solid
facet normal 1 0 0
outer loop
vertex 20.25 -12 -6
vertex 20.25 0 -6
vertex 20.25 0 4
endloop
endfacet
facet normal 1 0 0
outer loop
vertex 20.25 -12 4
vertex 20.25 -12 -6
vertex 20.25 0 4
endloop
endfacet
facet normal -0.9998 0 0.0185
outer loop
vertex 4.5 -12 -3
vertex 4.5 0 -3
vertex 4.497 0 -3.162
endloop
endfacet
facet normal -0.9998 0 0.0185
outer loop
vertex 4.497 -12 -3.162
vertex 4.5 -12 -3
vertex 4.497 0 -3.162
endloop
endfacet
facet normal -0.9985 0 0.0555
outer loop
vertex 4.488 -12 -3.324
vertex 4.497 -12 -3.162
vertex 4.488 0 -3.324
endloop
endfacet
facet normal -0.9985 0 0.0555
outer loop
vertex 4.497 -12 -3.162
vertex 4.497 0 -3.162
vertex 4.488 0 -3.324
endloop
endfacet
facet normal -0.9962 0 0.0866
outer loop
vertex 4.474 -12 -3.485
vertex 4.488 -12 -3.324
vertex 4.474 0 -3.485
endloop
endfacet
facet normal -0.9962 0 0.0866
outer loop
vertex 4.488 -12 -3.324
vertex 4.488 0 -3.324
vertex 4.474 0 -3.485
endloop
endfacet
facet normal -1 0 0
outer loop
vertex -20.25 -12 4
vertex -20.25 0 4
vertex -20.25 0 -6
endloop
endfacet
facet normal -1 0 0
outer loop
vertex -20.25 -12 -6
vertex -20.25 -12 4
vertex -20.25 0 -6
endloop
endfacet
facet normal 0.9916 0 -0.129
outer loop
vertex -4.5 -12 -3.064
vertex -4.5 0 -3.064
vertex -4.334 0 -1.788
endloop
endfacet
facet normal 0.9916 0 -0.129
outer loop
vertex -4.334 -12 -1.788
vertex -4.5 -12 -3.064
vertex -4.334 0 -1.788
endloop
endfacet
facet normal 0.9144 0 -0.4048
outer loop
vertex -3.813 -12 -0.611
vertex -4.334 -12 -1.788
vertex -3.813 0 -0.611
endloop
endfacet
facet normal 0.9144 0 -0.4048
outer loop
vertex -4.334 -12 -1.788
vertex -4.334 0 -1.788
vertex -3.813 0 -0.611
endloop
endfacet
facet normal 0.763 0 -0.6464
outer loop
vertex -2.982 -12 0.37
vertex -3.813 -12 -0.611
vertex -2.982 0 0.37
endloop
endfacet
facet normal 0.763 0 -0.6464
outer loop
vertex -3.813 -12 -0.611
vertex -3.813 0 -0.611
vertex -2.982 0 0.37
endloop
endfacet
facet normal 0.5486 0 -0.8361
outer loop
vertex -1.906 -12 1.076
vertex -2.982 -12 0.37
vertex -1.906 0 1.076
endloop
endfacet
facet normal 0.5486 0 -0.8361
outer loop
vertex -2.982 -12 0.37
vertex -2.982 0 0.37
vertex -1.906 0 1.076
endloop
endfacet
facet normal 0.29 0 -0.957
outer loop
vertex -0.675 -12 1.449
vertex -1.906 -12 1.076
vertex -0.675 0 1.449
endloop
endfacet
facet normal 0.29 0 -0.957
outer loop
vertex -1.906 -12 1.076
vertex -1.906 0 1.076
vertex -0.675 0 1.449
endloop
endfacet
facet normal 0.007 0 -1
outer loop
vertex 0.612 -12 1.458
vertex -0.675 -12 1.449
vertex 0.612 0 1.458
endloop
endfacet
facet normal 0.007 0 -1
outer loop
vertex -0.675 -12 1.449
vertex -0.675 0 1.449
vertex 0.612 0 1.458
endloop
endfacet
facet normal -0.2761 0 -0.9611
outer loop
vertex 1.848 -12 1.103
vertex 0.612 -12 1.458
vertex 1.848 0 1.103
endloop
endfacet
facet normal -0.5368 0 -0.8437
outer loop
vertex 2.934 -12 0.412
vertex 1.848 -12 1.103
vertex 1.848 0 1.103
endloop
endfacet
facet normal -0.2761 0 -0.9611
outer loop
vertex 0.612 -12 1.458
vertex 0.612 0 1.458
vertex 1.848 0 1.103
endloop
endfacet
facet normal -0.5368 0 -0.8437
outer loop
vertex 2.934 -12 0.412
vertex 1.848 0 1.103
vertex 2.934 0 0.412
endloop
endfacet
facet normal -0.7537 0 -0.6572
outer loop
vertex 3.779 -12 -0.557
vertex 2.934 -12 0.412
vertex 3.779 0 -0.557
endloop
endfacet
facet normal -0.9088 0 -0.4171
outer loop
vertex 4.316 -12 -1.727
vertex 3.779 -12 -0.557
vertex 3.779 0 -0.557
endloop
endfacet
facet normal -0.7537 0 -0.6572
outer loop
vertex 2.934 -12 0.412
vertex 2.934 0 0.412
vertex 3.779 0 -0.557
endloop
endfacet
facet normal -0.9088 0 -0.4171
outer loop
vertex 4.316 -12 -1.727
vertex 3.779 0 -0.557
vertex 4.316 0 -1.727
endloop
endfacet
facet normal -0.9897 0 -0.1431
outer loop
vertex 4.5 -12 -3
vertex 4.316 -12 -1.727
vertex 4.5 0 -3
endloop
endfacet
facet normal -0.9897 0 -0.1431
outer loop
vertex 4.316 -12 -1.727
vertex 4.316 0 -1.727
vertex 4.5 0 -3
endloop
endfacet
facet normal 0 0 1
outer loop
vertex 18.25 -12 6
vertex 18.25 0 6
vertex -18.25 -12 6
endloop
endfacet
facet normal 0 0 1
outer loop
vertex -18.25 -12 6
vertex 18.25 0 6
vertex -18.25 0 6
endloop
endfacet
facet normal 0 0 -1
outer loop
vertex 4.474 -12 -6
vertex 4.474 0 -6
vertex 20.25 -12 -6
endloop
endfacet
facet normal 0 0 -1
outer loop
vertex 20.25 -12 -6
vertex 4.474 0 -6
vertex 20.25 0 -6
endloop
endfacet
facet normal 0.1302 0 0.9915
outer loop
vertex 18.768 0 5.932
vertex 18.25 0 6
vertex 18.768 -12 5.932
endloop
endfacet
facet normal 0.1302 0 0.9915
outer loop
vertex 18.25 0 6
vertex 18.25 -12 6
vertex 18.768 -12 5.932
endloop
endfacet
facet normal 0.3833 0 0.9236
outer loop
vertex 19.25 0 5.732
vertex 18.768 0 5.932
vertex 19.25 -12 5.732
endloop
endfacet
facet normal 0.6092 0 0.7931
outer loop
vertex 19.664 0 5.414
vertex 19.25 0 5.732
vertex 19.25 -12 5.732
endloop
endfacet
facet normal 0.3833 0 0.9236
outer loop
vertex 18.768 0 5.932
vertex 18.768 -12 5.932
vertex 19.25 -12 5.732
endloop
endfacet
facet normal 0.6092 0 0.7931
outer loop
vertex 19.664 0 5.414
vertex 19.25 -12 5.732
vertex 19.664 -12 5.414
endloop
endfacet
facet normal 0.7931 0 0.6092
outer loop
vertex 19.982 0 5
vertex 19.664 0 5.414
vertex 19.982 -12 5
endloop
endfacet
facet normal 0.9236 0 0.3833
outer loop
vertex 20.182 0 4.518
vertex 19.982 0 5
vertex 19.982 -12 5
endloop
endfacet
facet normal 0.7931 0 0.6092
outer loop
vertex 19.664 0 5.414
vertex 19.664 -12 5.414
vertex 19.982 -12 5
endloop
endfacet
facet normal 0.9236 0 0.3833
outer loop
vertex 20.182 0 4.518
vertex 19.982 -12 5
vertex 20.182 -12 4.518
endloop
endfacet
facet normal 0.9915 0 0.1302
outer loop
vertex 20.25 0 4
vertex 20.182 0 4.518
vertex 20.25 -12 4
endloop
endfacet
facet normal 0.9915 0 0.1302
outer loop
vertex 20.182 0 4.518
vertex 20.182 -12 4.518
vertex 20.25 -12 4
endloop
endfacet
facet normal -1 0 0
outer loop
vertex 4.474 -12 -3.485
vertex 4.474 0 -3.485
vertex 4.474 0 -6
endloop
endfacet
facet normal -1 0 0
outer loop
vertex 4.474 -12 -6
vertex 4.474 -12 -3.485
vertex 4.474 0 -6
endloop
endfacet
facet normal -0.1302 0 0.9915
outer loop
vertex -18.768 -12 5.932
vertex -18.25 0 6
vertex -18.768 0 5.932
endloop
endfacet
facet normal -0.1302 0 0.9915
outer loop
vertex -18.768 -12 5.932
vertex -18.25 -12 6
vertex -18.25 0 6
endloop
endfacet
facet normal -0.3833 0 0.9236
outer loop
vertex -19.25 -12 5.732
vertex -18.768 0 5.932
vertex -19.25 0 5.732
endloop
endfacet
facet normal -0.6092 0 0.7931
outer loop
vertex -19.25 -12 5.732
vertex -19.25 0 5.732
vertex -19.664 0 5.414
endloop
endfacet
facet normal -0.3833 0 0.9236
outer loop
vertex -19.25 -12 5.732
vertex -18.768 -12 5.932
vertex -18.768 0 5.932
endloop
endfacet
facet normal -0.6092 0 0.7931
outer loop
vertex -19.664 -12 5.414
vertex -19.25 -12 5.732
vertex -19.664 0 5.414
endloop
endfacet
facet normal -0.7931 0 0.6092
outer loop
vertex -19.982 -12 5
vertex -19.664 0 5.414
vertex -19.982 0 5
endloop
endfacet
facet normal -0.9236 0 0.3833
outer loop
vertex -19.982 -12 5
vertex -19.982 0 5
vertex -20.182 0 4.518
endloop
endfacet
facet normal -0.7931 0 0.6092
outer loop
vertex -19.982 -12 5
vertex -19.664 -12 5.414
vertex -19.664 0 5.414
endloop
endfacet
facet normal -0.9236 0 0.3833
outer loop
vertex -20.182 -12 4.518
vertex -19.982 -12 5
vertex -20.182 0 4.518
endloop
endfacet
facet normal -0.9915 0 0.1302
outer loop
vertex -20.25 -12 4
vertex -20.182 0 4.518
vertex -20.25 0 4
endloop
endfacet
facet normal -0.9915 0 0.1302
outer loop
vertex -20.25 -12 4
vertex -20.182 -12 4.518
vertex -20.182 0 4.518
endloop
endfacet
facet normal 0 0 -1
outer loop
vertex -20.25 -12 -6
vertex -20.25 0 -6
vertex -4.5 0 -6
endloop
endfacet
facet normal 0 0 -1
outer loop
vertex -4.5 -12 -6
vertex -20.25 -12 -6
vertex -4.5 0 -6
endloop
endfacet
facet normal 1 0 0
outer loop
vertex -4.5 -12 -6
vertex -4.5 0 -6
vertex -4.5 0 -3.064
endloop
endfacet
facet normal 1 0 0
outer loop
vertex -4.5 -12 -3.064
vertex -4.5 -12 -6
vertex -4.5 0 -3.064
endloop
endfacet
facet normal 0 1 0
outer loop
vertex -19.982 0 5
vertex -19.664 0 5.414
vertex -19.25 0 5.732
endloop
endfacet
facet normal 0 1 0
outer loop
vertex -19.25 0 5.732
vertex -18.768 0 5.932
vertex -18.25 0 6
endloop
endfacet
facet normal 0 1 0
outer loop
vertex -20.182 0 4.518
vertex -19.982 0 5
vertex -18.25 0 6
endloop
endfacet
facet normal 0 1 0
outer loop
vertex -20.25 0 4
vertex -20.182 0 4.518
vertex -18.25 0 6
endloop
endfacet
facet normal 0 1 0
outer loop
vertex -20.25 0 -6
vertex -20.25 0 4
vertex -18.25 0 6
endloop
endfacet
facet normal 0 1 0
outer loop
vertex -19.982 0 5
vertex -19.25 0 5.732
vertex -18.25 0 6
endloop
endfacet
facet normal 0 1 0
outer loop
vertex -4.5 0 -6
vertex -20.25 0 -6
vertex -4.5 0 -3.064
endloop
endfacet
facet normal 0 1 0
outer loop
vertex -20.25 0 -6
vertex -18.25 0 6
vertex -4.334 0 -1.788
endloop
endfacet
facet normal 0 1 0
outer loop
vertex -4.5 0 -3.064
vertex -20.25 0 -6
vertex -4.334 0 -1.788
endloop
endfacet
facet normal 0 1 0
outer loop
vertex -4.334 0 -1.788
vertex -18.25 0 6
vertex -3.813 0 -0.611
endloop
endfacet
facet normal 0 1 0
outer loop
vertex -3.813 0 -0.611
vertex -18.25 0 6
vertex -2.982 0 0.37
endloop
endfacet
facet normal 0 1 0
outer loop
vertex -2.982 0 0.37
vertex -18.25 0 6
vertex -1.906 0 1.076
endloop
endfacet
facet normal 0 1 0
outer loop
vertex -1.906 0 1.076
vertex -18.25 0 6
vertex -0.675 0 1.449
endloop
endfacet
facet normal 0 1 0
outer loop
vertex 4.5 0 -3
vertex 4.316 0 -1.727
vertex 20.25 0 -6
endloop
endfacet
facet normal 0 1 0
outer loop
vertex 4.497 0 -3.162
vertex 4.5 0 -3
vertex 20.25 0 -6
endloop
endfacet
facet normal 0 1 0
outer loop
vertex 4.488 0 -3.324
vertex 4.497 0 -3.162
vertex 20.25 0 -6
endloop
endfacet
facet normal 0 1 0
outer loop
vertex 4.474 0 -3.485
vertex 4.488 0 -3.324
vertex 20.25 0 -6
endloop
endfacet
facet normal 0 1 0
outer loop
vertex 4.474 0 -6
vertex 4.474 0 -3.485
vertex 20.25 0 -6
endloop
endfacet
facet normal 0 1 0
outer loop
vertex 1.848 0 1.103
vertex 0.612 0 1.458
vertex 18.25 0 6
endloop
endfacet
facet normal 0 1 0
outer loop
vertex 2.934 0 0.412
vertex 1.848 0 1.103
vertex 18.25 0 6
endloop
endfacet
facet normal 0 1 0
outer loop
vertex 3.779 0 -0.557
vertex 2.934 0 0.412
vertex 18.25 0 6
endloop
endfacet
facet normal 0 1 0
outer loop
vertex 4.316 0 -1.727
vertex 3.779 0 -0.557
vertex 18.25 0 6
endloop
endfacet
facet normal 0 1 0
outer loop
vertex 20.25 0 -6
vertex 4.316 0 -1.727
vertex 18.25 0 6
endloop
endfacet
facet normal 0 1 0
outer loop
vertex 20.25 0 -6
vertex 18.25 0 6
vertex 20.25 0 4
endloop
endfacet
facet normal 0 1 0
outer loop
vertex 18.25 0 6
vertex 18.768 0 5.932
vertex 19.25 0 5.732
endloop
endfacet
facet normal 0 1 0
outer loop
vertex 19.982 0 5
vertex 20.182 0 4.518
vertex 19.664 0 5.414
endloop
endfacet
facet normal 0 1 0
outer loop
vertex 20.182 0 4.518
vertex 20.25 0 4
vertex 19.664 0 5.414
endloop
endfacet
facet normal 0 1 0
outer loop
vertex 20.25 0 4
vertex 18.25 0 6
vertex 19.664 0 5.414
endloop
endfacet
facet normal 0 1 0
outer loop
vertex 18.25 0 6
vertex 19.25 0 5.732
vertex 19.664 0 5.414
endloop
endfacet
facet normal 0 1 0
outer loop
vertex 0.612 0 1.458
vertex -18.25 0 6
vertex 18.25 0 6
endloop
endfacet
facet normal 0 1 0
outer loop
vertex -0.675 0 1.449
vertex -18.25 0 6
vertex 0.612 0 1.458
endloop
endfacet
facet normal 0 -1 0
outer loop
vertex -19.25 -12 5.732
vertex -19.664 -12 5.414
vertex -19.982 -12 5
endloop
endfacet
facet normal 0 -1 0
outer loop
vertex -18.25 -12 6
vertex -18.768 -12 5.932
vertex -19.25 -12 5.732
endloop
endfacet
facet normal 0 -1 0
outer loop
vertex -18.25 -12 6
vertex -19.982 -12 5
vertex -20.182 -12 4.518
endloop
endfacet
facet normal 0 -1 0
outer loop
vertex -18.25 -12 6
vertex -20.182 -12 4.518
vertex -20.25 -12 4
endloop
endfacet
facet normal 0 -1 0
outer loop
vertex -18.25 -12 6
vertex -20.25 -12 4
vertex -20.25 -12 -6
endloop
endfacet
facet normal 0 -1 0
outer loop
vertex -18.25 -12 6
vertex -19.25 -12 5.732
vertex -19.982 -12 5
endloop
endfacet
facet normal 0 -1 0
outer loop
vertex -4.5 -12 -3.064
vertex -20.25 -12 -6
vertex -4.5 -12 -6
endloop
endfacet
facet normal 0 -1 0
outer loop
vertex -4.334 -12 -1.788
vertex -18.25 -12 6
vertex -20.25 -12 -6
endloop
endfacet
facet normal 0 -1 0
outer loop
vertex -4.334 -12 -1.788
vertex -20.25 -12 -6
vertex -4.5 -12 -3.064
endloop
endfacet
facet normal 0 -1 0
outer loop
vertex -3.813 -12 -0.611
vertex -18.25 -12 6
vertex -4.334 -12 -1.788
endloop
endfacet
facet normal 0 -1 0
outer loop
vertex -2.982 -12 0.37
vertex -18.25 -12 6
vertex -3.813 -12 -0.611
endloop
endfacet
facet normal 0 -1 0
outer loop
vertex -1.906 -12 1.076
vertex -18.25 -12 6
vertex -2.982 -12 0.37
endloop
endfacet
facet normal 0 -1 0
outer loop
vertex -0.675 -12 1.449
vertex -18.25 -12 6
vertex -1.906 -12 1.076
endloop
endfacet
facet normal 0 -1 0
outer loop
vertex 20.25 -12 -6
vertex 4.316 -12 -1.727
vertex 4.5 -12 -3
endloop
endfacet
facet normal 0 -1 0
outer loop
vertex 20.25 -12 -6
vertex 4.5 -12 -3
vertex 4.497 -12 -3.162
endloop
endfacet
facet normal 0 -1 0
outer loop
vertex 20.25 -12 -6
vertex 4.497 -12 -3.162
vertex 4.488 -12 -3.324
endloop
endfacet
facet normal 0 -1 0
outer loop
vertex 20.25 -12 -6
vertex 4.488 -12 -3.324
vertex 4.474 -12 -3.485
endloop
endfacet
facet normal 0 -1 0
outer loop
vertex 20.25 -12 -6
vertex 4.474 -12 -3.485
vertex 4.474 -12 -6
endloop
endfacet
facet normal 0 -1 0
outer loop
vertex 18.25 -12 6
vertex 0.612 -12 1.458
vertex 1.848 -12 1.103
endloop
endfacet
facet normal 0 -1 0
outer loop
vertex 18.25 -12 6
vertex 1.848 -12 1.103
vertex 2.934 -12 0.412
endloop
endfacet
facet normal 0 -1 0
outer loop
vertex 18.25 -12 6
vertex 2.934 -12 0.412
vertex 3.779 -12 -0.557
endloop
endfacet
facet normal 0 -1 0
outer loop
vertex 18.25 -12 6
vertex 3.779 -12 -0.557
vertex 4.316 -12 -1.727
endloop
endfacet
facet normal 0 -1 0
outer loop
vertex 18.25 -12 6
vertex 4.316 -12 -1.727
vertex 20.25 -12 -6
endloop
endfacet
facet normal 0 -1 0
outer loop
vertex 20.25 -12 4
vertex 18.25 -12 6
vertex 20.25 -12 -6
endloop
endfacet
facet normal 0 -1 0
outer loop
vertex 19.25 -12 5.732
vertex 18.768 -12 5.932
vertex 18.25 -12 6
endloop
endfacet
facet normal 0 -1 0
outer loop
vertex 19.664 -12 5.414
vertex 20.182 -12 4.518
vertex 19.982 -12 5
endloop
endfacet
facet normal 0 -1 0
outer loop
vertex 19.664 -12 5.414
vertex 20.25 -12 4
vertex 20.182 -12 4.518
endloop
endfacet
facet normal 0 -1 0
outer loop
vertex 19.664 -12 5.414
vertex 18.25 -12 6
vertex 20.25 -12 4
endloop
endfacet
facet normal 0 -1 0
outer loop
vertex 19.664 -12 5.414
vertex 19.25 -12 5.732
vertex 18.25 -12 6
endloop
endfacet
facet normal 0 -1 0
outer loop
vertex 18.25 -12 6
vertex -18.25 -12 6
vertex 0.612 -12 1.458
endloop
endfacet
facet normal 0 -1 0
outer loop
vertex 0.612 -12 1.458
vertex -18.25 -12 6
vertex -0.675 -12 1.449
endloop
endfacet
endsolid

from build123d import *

# Parameters (mm, degrees)
F1_DEPTH = 12
F2_R     = 2


with BuildPart() as f1:
    # F0 (on Front) → F1 (new body)
    with BuildSketch(Plane.XZ):
        with BuildLine():
            Line((20.25, 6), (-20.25, 6))
            Line((-20.25, 6), (-20.25, -6))
            Line((-20.25, -6), (-4.499552, -6))
            Line((-4.499552, -6), (-4.499552, -3.063528))
            ThreePointArc((-4.499552, -3.063528), (-0.031765, 1.499888), (4.5, -3))
            ThreePointArc((4.5, -3), (4.493441, -3.242866), (4.473785, -3.485024))
            Line((4.473785, -3.485024), (4.473785, -6))
            Line((4.473785, -6), (20.25, -6))
            Line((20.25, -6), (20.25, 6))
        make_face()
    extrude(amount=F1_DEPTH)

    # F2
    f2_edges = [f1.edges().sort_by_distance(p)[0] for p in [
        (20.25, -6, 6),
        (-20.25, -6, 6),
    ]]
    fillet(f2_edges, radius=F2_R)


solid = f1.part
